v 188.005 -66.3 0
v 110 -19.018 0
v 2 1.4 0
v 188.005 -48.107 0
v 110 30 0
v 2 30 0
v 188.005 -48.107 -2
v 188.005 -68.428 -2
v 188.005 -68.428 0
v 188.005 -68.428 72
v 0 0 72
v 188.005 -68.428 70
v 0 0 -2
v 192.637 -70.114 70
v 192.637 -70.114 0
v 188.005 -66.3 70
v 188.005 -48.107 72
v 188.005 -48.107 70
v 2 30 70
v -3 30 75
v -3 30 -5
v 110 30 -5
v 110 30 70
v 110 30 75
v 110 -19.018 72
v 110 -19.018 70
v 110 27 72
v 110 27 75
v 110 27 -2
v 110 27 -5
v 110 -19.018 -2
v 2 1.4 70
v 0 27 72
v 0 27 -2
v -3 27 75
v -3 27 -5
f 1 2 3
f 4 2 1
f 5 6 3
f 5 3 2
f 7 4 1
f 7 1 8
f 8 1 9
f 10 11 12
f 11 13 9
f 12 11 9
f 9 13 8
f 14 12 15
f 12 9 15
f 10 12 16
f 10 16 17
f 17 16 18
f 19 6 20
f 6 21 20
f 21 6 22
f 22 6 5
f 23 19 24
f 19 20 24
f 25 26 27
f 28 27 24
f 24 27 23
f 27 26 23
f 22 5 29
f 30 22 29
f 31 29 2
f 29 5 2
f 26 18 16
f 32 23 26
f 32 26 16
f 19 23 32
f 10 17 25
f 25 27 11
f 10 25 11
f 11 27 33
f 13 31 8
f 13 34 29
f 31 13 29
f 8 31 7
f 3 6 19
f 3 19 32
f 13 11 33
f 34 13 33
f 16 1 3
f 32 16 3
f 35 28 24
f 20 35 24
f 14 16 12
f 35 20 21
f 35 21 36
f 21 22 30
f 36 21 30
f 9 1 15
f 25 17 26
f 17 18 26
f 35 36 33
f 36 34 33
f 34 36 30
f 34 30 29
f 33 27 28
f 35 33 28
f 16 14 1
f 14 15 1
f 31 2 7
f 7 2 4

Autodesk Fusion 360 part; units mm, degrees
sketch "Sketch1" plane through (0, 0, 0) normal (0, 0, 1) x (1, 0, 0)
  line L0 (0, 0) -> (0, 30)
  line L1 (0, 0) -> (192.637, -70.1141)
  line L2 (0, 0) -> (200, 0) construction
  line L3 (192.637, -70.1141) -> (188.0053, -66.3)
  line L4 (192.637, -70.1141) -> (203.3355, -70.1141) construction
  line L5 (188.0053, -66.3) -> (2, 1.4004)
  line L6 (0, 30) -> (2, 30)
  line L7 (2, 30) -> (2, 1.4004)
  dimension "d2" = 30
  dimension "d3" = 20
  dimension "d4" = 205
  dimension "d6" = 6
  dimension "d10" = 2
  dimension "d13" = 140.529
extrude "Extrude1" add sketch "Sketch1" along normal blind 70 makes body 1
sketch "Sketch2" plane through (0, 0, 0) normal (0, 0, 1) x (1, 0, 0)
  line L0 (2, 1.4004) -> (2, 30)
  line L1 (0, 30) -> (110, 30)
  line L2 (110, 30) -> (110, -19.0179)
  line L3 (110, -19.0179) -> (188.0053, -48.1069)
  line L4 (188.0053, -66.3) -> (188.0053, -48.1069)
  line L5 (2, 30) -> (0, 30)
  line L6 (0, 30) -> (0, 0)
  line L7 (0, 30) -> (0, 29)
  line L8 (0, 0) -> (192.637, -70.1141)
  line L9 (0, 0) -> (192.7051, -70.1389)
  line L10 (188.0053, -66.3) -> (188.0053, -68.4283)
  point P0 (2, 30)
  point P1 (188.0053, -66.3)
  point P2 (0, 30)
  dimension "d16" = 110
extrude "Extrude2" add sketch "Sketch2" against normal blind 2 bodies 1
ref_plane "WorkPlane1" through (0, 0, 35) normal (0, 0, 1) x (1, 0, 0)
mirror "Mirror1" about plane through (0, 0, 35) normal (0, 0, 1) of bodies 1 makes body 2
sketch "Sketch3" plane through (0, 0, 72) normal (0, 0, 1) x (-1, 0, 0)
  line L0 (-110, -30) -> (0, -30)
  line L1 (0, -30) -> (0, 0)
  line L2 (0, 0) -> (-188.0053, 68.4283)
  line L3 (-188.0053, 68.4283) -> (-188.0053, 48.1069)
  line L4 (-188.0053, 48.1069) -> (-110, 19.0179)
  line L5 (-110, 19.0179) -> (-110, -30)
  line L6 (0, -30) -> (-110, -30)
  line L7 (-110, -30) -> (-110, -27)
  line L8 (-110, -27) -> (0, -27)
  line L9 (0, -27) -> (0, -30)
  dimension "d22" = 3
extrude "Extrude3" add sketch "Sketch3" along normal blind 3 contours L0 L1 L5 L6 L7 L8 L9 bodies 2
sketch "Sketch4" plane through (0, 0, -2) normal (0, 0, -1) x (1, 0, 0)
  line L0 (0, -30) -> (110, -30)
  line L1 (110, -30) -> (110, 19.0179)
  line L2 (110, 19.0179) -> (188.0053, 48.1069)
  line L3 (188.0053, 48.1069) -> (188.0053, 68.4283)
  line L4 (188.0053, 68.4283) -> (0, 0)
  line L5 (0, 0) -> (0, -30)
  line L6 (110, -30) -> (0, -30)
  line L7 (0, -30) -> (0, -27)
  line L8 (0, -27) -> (110, -27)
  line L9 (110, -27) -> (110, -30)
  dimension "d25" = 3
extrude "Extrude4" add sketch "Sketch4" along normal blind 3 contours L0 L1 L5 L6 L7 L8 L9 bodies 1
sketch "Sketch5" plane through (0, 0, 0) normal (-1, 0, 0) x (0, -1, 0)
  line L0 (0, 0) -> (0, 72)
  line L1 (0, 72) -> (-27, 72)
  line L2 (-27, 72) -> (-27, 75)
  line L3 (-27, 75) -> (-30, 75)
  line L4 (-30, 75) -> (-30, 0)
  line L5 (-30, 0) -> (0, 0)
  line L6 (-30, -5) -> (-27, -5)
  line L7 (-27, -5) -> (-27, 75)
  line L8 (-27, 75) -> (-30, 75)
  line L9 (-30, 75) -> (-30, -5)
  point P0 (-30, -5)
extrude "Extrude5" add sketch "Sketch5" along normal blind 3 contours L5 L6 L7 L9 | L2 L3 L4 L5 L7 L8 L9 bodies 1 2
